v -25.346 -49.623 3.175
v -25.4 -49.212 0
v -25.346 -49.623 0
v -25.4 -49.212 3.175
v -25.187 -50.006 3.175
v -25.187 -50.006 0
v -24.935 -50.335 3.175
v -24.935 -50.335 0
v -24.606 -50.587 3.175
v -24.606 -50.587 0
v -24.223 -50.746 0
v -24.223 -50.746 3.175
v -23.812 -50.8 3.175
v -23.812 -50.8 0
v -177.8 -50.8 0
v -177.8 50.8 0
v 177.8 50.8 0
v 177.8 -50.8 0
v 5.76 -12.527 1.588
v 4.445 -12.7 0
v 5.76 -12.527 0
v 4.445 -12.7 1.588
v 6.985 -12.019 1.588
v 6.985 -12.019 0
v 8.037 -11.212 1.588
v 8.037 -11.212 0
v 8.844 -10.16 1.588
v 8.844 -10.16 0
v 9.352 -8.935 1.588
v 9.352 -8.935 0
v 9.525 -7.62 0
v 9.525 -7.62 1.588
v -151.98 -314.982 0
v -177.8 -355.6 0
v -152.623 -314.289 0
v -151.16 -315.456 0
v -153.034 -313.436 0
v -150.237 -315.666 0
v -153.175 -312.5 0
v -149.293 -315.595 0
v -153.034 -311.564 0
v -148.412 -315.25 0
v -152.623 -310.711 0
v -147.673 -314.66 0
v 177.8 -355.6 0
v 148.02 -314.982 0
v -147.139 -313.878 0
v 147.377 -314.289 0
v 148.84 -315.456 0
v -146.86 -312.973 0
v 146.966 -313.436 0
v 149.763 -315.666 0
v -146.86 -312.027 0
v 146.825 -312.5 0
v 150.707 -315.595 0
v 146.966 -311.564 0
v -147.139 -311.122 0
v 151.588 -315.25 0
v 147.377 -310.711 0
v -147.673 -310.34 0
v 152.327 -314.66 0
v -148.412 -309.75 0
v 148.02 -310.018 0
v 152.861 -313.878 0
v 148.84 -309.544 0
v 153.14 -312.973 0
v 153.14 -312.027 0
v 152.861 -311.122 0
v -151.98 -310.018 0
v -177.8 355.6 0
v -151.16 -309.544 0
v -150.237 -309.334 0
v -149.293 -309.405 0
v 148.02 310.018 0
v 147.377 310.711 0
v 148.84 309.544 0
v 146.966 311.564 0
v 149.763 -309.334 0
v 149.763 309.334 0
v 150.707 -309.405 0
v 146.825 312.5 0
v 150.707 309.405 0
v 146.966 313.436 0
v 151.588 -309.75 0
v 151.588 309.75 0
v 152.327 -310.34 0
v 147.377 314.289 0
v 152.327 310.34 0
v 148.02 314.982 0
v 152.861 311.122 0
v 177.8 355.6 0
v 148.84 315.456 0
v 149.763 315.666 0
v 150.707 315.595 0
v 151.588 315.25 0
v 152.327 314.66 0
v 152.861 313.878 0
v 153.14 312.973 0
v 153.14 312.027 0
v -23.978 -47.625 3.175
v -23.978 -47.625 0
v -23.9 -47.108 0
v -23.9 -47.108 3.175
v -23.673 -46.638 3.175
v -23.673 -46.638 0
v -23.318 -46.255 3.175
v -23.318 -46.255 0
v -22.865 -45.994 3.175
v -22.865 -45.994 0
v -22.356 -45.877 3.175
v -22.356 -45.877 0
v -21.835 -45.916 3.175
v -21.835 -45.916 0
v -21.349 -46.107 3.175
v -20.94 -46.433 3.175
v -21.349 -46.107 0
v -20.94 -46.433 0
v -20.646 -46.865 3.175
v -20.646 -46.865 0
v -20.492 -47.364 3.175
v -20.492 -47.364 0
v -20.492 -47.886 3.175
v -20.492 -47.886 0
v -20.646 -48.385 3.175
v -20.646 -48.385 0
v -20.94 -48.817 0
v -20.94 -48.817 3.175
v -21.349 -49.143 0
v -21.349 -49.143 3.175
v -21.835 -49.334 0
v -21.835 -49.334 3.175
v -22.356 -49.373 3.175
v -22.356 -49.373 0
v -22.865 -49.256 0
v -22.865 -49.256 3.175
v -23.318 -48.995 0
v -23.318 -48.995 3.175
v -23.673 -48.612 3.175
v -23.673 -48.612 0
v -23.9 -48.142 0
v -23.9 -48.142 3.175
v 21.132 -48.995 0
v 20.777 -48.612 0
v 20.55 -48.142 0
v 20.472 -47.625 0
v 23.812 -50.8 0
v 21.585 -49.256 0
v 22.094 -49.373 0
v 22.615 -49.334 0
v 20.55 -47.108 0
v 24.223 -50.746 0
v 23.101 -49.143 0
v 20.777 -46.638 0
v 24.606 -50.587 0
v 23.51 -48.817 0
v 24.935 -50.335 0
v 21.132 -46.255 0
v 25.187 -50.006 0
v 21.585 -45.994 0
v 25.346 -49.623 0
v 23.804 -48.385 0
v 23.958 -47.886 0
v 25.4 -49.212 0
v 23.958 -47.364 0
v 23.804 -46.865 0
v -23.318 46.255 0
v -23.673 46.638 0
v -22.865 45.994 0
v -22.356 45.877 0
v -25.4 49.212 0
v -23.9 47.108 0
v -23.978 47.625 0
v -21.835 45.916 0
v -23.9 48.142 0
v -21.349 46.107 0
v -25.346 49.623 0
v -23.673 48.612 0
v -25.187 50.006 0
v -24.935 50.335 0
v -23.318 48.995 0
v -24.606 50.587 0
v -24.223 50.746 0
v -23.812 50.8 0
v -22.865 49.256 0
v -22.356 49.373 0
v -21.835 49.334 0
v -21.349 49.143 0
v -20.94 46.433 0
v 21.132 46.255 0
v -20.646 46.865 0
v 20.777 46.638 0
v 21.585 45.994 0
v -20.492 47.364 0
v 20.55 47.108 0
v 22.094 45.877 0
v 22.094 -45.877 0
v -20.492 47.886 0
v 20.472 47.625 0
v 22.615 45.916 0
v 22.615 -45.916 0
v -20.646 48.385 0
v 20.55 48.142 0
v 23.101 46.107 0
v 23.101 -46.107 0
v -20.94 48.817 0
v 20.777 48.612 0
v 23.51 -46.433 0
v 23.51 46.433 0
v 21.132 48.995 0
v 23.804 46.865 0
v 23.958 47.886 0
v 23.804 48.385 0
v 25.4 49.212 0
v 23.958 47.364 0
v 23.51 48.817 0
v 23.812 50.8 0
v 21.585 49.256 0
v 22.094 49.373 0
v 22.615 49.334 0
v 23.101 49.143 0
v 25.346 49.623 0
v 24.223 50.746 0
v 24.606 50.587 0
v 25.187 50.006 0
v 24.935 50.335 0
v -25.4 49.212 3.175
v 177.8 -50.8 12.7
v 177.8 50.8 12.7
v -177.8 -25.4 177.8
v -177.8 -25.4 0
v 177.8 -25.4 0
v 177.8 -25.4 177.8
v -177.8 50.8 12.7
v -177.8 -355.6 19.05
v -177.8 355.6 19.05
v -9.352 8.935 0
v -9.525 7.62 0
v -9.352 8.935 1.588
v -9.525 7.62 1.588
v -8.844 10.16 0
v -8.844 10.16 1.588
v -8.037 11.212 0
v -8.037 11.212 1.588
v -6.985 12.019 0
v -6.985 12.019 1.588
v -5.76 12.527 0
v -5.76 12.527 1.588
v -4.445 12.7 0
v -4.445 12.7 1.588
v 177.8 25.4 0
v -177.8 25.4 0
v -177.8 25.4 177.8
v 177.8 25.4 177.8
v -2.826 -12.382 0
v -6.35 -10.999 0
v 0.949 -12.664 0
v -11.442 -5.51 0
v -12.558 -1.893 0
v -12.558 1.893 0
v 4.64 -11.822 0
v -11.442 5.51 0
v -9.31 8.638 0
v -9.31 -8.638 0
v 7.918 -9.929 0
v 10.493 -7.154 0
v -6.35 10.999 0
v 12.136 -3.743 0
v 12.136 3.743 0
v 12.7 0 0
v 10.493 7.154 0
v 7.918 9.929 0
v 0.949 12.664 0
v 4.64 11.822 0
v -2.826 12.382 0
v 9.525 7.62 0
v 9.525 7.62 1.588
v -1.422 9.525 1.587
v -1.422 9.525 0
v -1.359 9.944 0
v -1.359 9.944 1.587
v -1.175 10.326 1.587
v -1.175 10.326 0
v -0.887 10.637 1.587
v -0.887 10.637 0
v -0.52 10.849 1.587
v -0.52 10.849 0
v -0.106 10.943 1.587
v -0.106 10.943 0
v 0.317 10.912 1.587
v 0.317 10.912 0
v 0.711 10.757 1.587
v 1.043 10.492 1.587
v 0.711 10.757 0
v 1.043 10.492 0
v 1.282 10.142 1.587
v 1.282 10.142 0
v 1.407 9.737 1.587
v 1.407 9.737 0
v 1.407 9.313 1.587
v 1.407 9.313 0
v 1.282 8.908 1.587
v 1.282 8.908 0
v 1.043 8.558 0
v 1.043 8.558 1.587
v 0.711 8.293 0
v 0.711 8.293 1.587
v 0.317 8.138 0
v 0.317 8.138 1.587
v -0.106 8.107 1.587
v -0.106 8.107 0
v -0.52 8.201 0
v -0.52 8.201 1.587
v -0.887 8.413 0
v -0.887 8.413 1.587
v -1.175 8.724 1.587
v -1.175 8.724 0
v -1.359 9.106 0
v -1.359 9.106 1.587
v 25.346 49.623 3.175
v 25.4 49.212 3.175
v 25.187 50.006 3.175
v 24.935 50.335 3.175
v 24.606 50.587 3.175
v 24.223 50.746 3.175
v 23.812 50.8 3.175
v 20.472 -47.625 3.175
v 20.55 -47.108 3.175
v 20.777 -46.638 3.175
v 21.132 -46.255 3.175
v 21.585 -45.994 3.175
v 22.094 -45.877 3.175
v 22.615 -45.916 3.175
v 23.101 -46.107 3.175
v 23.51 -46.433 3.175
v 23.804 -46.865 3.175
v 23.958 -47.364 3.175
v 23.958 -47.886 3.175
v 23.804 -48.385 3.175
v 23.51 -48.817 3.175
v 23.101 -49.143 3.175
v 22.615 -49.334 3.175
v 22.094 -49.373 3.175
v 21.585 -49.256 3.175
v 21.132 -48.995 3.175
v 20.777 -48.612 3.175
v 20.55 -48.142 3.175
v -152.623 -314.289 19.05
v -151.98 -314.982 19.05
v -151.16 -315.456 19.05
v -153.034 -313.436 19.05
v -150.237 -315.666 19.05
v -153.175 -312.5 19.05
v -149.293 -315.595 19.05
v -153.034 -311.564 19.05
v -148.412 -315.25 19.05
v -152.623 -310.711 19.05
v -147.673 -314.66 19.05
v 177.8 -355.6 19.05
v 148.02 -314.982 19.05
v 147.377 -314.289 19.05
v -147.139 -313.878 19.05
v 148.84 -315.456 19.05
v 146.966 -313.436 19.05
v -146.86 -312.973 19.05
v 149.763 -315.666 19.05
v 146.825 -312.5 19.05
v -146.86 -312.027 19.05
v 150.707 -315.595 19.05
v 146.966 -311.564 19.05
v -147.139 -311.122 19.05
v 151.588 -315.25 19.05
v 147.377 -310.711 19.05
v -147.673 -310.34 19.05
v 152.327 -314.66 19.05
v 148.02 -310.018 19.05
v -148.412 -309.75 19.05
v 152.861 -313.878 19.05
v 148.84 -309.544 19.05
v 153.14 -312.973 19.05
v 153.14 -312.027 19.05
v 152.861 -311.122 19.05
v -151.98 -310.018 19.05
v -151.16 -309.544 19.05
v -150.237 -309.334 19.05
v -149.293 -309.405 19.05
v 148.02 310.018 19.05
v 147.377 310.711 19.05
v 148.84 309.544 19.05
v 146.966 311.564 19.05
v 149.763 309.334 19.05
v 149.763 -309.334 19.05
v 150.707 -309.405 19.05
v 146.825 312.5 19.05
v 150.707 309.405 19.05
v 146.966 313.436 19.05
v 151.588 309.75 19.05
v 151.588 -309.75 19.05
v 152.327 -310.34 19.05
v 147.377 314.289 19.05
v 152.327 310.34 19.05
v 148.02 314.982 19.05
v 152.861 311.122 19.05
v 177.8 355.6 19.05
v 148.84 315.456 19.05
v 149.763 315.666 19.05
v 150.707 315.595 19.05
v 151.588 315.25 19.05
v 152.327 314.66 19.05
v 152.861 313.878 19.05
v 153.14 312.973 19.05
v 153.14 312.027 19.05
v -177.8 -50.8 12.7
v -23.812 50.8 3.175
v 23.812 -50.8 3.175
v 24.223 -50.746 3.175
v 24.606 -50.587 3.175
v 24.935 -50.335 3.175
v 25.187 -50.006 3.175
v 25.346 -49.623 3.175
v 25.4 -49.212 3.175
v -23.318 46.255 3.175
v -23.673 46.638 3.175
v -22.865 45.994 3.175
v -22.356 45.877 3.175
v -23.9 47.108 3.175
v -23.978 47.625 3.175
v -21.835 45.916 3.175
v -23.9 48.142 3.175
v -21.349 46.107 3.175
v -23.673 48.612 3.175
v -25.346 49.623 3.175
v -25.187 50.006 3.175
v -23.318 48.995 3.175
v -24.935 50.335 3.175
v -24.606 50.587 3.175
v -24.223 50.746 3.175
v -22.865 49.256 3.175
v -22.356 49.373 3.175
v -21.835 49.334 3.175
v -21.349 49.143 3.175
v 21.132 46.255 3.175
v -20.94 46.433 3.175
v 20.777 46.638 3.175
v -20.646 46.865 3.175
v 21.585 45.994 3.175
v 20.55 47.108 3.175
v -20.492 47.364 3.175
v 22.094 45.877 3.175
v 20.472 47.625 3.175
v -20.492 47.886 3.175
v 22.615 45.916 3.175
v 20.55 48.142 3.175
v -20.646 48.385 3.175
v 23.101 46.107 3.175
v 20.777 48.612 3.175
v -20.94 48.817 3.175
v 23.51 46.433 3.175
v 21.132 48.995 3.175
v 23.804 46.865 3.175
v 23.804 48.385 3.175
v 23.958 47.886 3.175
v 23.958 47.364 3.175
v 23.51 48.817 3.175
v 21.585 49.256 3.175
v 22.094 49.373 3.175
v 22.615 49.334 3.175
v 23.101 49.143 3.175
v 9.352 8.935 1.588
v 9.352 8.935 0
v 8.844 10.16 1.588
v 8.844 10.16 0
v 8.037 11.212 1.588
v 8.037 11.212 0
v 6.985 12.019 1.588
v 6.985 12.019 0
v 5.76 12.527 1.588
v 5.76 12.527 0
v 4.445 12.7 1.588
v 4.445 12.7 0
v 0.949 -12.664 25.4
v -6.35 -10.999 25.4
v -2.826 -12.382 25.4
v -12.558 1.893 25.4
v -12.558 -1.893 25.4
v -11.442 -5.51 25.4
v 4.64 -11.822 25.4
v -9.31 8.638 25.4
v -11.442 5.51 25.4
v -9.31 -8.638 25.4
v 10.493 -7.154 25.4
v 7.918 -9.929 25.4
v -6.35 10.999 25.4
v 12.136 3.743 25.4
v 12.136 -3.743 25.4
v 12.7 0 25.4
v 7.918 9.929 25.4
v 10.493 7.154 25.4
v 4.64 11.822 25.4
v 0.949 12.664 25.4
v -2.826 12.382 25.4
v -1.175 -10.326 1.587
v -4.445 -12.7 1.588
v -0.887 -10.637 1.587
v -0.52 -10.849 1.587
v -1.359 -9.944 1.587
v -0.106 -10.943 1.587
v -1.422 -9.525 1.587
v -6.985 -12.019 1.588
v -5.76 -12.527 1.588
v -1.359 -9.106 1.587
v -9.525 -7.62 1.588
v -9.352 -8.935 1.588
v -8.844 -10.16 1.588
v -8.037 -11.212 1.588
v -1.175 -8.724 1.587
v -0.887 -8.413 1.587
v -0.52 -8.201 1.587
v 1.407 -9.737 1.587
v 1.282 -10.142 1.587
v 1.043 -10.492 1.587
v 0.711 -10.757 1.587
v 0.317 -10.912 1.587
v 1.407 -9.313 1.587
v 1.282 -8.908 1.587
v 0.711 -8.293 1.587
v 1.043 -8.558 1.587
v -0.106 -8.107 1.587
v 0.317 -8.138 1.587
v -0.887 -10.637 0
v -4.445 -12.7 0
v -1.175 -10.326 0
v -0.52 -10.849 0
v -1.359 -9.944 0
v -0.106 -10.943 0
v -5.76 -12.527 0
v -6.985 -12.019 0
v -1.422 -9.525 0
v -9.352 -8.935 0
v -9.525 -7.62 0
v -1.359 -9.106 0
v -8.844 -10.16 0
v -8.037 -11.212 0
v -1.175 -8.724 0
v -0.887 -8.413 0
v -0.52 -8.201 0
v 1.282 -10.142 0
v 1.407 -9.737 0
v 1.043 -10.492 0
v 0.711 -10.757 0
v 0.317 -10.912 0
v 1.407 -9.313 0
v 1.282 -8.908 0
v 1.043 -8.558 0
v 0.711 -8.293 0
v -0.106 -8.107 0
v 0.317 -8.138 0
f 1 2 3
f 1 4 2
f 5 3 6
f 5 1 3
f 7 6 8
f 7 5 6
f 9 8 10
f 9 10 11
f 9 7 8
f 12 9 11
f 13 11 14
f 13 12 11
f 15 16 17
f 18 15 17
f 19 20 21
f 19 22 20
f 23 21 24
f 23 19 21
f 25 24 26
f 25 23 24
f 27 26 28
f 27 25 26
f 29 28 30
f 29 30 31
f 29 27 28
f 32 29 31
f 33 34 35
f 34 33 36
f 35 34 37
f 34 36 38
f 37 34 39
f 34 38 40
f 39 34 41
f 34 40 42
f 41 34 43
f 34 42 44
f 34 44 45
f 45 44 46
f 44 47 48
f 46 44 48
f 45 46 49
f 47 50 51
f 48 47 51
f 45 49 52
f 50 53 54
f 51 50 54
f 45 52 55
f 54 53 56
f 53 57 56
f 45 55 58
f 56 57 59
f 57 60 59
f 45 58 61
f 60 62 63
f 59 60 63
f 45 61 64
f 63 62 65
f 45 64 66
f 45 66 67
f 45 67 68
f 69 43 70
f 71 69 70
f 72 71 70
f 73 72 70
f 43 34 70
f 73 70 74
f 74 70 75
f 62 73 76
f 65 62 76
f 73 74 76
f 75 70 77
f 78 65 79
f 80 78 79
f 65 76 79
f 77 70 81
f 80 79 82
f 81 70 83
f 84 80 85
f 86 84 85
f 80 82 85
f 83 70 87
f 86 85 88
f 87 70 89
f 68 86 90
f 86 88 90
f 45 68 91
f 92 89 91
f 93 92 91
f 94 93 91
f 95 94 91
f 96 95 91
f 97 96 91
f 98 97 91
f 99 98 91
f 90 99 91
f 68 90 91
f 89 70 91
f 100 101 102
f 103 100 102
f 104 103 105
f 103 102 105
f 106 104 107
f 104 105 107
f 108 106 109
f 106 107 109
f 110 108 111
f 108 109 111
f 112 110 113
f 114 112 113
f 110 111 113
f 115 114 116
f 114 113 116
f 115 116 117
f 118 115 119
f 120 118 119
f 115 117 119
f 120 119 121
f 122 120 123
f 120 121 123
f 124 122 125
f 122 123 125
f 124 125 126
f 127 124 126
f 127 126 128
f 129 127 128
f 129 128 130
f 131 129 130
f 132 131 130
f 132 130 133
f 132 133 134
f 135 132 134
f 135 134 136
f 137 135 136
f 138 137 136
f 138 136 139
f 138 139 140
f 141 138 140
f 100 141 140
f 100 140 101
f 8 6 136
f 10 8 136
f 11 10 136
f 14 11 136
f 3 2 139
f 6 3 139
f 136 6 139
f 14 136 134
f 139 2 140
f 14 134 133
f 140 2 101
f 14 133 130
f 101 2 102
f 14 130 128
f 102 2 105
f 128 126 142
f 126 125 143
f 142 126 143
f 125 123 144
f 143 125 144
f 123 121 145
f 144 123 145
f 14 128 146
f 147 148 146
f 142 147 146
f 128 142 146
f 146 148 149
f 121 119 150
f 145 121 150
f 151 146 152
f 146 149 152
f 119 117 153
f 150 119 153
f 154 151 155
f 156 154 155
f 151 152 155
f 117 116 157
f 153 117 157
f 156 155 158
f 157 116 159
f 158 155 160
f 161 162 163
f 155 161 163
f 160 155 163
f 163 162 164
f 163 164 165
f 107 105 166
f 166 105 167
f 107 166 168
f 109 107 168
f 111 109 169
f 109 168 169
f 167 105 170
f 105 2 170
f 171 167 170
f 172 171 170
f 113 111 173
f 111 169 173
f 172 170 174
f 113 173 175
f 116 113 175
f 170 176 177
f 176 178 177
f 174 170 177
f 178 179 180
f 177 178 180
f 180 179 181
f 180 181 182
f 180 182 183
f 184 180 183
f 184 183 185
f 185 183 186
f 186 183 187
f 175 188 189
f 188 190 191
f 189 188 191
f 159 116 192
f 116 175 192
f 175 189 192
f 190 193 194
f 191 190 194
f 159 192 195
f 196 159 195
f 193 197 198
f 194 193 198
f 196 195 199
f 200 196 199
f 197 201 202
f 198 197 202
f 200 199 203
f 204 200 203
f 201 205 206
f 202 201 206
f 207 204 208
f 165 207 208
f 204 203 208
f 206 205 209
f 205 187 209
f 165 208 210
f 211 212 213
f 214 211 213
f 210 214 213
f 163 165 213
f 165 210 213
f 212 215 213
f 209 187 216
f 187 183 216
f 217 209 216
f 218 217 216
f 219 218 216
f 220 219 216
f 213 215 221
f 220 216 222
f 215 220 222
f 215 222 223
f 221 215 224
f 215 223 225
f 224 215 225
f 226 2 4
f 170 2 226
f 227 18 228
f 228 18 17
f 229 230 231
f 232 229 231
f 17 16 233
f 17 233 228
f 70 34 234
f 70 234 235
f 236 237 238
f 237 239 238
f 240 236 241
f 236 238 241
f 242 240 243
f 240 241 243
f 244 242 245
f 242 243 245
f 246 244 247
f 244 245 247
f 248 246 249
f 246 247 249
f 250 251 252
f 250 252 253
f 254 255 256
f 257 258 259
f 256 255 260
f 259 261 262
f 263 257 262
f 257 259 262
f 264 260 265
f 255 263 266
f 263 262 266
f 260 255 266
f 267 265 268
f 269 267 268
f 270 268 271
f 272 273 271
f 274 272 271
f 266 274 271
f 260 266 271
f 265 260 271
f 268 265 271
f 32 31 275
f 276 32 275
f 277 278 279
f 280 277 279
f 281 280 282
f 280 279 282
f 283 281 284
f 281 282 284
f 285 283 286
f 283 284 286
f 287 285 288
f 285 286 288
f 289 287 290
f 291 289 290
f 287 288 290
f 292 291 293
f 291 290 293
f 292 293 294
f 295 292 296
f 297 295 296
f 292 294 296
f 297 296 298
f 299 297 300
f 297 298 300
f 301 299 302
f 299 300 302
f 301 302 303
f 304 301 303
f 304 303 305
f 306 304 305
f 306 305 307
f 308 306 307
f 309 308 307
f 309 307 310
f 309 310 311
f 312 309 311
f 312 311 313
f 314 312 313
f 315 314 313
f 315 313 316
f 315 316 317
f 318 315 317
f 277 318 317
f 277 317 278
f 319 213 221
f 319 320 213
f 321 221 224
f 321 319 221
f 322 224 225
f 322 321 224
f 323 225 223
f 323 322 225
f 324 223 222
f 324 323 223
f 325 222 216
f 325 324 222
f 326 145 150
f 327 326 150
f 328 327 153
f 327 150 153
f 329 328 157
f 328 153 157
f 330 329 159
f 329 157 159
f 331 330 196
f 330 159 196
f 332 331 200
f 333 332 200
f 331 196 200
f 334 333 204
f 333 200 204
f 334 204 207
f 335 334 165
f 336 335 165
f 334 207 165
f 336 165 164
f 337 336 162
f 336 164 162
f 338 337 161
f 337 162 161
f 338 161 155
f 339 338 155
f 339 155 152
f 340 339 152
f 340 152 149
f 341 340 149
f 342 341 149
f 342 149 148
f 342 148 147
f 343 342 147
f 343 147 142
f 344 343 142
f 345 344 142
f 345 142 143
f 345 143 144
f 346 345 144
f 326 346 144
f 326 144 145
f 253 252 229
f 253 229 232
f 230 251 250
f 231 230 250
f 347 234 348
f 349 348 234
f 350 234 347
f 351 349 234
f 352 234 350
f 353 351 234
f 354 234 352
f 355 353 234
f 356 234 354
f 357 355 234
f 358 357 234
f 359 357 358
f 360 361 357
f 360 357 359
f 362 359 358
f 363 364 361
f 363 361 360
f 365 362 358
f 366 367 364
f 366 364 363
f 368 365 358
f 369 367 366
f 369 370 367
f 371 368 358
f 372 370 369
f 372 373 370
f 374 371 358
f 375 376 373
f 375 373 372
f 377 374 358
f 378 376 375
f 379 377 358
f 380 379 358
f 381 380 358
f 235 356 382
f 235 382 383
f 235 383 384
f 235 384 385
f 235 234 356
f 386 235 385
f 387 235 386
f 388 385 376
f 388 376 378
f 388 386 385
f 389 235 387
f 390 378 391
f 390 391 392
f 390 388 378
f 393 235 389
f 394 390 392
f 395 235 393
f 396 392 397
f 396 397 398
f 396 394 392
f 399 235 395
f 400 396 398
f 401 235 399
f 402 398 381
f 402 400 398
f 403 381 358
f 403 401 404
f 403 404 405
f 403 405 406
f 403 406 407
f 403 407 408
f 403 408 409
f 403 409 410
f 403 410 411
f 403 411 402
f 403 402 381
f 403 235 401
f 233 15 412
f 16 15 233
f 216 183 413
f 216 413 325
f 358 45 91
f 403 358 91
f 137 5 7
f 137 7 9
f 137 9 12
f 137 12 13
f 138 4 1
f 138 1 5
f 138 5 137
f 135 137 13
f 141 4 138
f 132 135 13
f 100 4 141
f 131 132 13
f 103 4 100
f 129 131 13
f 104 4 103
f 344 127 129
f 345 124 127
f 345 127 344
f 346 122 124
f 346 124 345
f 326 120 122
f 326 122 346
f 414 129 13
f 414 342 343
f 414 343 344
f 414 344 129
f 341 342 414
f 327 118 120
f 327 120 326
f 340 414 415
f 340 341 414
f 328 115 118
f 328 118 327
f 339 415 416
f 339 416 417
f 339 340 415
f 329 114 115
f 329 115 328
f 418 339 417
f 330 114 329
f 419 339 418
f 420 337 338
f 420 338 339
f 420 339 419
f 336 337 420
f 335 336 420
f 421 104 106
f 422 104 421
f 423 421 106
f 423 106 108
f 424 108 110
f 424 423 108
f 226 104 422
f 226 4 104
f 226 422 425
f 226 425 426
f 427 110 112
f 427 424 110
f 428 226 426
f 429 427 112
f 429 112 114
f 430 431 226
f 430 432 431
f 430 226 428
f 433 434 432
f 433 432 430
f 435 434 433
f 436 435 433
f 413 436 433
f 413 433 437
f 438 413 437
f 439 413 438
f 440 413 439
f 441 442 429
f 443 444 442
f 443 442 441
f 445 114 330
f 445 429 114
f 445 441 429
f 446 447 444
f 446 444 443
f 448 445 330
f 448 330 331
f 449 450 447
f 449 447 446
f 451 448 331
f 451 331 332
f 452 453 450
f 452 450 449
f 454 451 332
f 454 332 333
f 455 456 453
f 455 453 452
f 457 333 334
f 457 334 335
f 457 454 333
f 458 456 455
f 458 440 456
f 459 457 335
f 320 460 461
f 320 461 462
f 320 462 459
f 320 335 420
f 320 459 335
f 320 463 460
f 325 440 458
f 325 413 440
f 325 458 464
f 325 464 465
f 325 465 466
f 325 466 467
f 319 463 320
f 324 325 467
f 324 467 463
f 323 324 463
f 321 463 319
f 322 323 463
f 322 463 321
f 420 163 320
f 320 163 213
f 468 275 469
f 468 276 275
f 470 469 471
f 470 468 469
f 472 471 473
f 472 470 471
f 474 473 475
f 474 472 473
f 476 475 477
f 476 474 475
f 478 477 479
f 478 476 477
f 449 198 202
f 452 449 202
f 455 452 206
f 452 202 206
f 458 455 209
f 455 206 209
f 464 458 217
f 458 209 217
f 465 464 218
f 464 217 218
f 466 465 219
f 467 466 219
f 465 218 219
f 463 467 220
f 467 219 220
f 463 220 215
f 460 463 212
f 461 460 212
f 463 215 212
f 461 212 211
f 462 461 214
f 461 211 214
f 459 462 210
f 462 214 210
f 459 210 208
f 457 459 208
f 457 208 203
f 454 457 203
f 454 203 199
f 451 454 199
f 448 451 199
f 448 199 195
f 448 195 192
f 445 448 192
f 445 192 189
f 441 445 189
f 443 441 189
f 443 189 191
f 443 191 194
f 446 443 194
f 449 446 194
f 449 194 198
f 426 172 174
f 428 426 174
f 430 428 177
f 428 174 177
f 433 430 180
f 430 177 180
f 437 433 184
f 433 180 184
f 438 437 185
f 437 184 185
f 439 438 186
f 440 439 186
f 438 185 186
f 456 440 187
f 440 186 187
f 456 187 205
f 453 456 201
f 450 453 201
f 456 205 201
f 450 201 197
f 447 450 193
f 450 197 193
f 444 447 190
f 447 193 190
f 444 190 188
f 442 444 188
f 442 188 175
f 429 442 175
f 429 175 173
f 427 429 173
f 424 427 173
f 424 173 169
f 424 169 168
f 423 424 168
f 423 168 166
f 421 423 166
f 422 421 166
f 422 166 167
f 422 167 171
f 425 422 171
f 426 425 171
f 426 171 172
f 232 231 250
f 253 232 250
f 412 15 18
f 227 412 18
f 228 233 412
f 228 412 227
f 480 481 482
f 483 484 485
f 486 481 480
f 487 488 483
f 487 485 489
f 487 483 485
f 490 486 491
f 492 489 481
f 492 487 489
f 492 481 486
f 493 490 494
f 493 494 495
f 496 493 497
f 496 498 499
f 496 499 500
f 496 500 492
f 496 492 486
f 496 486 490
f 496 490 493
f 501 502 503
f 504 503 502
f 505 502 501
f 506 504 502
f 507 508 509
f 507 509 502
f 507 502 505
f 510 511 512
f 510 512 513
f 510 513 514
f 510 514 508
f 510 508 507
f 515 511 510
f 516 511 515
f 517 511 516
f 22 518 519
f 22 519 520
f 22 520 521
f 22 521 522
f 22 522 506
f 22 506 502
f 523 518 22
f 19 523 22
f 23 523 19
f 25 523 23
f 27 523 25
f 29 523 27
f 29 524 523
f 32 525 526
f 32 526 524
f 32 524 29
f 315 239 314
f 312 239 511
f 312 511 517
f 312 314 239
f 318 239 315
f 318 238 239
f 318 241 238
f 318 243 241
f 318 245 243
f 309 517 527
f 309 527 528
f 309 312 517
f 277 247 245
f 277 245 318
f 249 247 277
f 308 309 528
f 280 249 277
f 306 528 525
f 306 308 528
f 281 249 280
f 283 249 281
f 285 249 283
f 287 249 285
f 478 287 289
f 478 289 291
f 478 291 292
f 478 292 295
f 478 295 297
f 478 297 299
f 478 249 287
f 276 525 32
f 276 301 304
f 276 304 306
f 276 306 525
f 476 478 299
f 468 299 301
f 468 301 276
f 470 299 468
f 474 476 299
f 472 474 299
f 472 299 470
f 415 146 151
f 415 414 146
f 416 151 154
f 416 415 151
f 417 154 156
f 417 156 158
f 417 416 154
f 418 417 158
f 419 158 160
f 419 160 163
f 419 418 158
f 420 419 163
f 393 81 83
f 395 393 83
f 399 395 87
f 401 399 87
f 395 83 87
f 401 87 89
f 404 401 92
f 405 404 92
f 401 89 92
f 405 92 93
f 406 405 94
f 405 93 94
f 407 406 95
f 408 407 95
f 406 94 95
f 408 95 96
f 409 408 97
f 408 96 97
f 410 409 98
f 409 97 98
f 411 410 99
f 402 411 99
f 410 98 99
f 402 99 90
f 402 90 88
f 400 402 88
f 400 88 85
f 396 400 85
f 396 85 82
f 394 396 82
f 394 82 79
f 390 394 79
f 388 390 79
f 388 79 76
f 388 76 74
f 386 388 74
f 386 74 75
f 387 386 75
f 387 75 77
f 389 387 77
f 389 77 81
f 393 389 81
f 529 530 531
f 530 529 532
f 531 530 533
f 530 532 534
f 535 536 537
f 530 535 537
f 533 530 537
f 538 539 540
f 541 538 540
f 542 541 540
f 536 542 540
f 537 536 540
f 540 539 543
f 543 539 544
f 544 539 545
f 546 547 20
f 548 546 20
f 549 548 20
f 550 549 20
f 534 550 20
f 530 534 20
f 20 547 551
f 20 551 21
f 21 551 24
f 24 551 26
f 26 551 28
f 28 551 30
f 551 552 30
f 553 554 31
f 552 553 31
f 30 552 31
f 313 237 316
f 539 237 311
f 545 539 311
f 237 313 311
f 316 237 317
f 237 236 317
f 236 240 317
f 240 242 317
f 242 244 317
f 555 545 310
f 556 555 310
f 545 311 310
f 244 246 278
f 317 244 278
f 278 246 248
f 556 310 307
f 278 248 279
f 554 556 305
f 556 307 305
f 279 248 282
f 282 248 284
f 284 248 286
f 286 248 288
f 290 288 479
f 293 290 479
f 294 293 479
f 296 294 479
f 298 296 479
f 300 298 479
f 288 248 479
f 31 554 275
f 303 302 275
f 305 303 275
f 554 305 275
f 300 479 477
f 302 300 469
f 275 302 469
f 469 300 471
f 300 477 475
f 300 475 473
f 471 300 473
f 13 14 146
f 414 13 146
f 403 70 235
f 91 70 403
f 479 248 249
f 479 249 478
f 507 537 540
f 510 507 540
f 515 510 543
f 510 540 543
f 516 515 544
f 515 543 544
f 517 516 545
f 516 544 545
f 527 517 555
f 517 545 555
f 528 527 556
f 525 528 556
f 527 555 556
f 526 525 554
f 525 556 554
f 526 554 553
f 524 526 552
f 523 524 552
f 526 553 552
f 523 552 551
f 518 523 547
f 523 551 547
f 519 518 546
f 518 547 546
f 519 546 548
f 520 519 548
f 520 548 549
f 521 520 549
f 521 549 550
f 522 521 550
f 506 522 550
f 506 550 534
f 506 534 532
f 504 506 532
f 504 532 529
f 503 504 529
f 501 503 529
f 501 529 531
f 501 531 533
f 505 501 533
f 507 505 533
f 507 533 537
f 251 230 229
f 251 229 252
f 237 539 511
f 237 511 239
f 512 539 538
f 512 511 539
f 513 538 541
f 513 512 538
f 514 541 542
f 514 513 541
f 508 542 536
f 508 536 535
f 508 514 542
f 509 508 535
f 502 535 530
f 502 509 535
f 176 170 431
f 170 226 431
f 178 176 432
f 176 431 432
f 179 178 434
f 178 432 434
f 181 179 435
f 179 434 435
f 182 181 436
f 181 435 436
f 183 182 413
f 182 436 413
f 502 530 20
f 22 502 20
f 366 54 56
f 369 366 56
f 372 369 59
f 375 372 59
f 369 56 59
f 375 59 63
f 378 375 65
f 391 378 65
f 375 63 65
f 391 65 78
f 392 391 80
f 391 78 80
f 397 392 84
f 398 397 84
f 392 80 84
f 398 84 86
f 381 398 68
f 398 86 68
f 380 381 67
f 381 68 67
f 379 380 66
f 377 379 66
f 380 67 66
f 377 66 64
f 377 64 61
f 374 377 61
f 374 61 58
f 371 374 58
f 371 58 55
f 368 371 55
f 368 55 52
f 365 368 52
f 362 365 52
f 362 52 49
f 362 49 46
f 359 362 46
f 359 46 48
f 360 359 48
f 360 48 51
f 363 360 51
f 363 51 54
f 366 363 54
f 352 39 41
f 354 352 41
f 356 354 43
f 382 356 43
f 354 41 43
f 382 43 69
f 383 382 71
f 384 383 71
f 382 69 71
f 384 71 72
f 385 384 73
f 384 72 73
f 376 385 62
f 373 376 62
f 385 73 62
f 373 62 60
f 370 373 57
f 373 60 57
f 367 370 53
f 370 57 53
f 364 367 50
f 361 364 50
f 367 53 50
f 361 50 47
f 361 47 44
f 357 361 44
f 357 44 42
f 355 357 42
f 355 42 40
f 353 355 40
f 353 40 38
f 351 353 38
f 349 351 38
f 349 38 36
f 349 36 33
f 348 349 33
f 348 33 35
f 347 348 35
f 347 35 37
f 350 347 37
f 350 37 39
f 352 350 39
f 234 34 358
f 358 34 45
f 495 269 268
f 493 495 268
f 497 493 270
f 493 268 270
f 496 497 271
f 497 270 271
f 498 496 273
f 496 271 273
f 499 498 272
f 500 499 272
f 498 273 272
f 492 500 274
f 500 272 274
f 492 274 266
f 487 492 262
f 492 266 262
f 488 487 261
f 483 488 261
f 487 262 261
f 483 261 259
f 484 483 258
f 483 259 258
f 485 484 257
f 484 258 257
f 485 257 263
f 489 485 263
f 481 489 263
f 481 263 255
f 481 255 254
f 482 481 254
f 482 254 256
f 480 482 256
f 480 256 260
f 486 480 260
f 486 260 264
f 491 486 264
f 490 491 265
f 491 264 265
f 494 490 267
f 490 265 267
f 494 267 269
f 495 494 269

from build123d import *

# Parameters (mm, degrees)
F0_W      = 355.6
F0_H      = 711.2
F1_DEPTH  = 19.05
F2_W      = 355.6
F2_H      = 50.8
F3_DEPTH  = 177.8
F4_W      = 355.6
F4_H      = 101.6
F5_DEPTH  = 12.7
F6_R      = 12.7
F7_DEPTH  = 25.4
F9_D      = 6.35
F10_W     = 50.8
F10_H     = 101.6
F11_DEPTH = 3.175
F12_R     = 1.5875
F14_D     = 3.5052
F15_W     = 19.05
F15_H     = 25.4
F16_DEPTH = 1.5875
F17_R     = 5.08
F19_D     = 2.8448


with BuildPart() as f1:
    # F0 (on Top) → F1 (new body)
    with BuildSketch(Plane.XY):
        Rectangle(F0_W, F0_H)
    extrude(amount=F1_DEPTH)

    # F9 (through all)
    with Locations(Plane.XY.offset(19.05)):
        with Locations((-150, -312.5), (150, -312.5), (150, 312.5)):
            Hole(F9_D / 2)


with BuildPart() as f3:
    # F2 (on Top) → F3 (new body)
    with BuildSketch(Plane.XY):
        Rectangle(F2_W, F2_H)
    extrude(amount=F3_DEPTH)


with BuildPart() as f5:
    # F4 (on Top) → F5 (new body)
    with BuildSketch(Plane.XY):
        Rectangle(F4_W, F4_H)
    extrude(amount=F5_DEPTH)


with BuildPart() as f7:
    # F6 (on Top) → F7 (new body)
    with BuildSketch(Plane.XY):
        Circle(F6_R)
    extrude(amount=F7_DEPTH)


with BuildPart() as f11:
    # F10 (on face) → F11 (new body)
    with BuildSketch(Plane.XY):
        Rectangle(F10_W, F10_H)
    extrude(amount=F11_DEPTH)

    # F12
    f12_edges = [f11.edges().sort_by_distance(p)[0] for p in [
        (25.4, -50.8, 1.5875),
        (-25.4, -50.8, 1.5875),
        (25.4, 50.8, 1.5875),
        (-25.4, 50.8, 1.5875),
    ]]
    fillet(f12_edges, radius=F12_R)

    # F14 (through all)
    with Locations(Plane.XY.offset(3.175)):
        with Locations((22.225, -47.625), (-22.225, -47.625), (-22.225, 47.625), (22.225, 47.625)):
            Hole(F14_D / 2)


with BuildPart() as f16:
    # F15 (on Top) → F16 (new body)
    with BuildSketch(Plane.XY):
        Rectangle(F15_W, F15_H)
    extrude(amount=F16_DEPTH)

    # F17
    f17_edges = [f16.edges().sort_by_distance(p)[0] for p in [
        (9.525, -12.7, 0.79375),
        (-9.525, -12.7, 0.79375),
        (9.525, 12.7, 0.79375),
        (-9.525, 12.7, 0.79375),
    ]]
    fillet(f17_edges, radius=F17_R)

    # F19 (through all)
    with Locations(Plane.XY.offset(1.5875)):
        with Locations((0, 9.525), (0, -9.525)):
            Hole(F19_D / 2)


solid = Compound([f1.part, f3.part, f5.part, f7.part, f11.part, f16.part])
